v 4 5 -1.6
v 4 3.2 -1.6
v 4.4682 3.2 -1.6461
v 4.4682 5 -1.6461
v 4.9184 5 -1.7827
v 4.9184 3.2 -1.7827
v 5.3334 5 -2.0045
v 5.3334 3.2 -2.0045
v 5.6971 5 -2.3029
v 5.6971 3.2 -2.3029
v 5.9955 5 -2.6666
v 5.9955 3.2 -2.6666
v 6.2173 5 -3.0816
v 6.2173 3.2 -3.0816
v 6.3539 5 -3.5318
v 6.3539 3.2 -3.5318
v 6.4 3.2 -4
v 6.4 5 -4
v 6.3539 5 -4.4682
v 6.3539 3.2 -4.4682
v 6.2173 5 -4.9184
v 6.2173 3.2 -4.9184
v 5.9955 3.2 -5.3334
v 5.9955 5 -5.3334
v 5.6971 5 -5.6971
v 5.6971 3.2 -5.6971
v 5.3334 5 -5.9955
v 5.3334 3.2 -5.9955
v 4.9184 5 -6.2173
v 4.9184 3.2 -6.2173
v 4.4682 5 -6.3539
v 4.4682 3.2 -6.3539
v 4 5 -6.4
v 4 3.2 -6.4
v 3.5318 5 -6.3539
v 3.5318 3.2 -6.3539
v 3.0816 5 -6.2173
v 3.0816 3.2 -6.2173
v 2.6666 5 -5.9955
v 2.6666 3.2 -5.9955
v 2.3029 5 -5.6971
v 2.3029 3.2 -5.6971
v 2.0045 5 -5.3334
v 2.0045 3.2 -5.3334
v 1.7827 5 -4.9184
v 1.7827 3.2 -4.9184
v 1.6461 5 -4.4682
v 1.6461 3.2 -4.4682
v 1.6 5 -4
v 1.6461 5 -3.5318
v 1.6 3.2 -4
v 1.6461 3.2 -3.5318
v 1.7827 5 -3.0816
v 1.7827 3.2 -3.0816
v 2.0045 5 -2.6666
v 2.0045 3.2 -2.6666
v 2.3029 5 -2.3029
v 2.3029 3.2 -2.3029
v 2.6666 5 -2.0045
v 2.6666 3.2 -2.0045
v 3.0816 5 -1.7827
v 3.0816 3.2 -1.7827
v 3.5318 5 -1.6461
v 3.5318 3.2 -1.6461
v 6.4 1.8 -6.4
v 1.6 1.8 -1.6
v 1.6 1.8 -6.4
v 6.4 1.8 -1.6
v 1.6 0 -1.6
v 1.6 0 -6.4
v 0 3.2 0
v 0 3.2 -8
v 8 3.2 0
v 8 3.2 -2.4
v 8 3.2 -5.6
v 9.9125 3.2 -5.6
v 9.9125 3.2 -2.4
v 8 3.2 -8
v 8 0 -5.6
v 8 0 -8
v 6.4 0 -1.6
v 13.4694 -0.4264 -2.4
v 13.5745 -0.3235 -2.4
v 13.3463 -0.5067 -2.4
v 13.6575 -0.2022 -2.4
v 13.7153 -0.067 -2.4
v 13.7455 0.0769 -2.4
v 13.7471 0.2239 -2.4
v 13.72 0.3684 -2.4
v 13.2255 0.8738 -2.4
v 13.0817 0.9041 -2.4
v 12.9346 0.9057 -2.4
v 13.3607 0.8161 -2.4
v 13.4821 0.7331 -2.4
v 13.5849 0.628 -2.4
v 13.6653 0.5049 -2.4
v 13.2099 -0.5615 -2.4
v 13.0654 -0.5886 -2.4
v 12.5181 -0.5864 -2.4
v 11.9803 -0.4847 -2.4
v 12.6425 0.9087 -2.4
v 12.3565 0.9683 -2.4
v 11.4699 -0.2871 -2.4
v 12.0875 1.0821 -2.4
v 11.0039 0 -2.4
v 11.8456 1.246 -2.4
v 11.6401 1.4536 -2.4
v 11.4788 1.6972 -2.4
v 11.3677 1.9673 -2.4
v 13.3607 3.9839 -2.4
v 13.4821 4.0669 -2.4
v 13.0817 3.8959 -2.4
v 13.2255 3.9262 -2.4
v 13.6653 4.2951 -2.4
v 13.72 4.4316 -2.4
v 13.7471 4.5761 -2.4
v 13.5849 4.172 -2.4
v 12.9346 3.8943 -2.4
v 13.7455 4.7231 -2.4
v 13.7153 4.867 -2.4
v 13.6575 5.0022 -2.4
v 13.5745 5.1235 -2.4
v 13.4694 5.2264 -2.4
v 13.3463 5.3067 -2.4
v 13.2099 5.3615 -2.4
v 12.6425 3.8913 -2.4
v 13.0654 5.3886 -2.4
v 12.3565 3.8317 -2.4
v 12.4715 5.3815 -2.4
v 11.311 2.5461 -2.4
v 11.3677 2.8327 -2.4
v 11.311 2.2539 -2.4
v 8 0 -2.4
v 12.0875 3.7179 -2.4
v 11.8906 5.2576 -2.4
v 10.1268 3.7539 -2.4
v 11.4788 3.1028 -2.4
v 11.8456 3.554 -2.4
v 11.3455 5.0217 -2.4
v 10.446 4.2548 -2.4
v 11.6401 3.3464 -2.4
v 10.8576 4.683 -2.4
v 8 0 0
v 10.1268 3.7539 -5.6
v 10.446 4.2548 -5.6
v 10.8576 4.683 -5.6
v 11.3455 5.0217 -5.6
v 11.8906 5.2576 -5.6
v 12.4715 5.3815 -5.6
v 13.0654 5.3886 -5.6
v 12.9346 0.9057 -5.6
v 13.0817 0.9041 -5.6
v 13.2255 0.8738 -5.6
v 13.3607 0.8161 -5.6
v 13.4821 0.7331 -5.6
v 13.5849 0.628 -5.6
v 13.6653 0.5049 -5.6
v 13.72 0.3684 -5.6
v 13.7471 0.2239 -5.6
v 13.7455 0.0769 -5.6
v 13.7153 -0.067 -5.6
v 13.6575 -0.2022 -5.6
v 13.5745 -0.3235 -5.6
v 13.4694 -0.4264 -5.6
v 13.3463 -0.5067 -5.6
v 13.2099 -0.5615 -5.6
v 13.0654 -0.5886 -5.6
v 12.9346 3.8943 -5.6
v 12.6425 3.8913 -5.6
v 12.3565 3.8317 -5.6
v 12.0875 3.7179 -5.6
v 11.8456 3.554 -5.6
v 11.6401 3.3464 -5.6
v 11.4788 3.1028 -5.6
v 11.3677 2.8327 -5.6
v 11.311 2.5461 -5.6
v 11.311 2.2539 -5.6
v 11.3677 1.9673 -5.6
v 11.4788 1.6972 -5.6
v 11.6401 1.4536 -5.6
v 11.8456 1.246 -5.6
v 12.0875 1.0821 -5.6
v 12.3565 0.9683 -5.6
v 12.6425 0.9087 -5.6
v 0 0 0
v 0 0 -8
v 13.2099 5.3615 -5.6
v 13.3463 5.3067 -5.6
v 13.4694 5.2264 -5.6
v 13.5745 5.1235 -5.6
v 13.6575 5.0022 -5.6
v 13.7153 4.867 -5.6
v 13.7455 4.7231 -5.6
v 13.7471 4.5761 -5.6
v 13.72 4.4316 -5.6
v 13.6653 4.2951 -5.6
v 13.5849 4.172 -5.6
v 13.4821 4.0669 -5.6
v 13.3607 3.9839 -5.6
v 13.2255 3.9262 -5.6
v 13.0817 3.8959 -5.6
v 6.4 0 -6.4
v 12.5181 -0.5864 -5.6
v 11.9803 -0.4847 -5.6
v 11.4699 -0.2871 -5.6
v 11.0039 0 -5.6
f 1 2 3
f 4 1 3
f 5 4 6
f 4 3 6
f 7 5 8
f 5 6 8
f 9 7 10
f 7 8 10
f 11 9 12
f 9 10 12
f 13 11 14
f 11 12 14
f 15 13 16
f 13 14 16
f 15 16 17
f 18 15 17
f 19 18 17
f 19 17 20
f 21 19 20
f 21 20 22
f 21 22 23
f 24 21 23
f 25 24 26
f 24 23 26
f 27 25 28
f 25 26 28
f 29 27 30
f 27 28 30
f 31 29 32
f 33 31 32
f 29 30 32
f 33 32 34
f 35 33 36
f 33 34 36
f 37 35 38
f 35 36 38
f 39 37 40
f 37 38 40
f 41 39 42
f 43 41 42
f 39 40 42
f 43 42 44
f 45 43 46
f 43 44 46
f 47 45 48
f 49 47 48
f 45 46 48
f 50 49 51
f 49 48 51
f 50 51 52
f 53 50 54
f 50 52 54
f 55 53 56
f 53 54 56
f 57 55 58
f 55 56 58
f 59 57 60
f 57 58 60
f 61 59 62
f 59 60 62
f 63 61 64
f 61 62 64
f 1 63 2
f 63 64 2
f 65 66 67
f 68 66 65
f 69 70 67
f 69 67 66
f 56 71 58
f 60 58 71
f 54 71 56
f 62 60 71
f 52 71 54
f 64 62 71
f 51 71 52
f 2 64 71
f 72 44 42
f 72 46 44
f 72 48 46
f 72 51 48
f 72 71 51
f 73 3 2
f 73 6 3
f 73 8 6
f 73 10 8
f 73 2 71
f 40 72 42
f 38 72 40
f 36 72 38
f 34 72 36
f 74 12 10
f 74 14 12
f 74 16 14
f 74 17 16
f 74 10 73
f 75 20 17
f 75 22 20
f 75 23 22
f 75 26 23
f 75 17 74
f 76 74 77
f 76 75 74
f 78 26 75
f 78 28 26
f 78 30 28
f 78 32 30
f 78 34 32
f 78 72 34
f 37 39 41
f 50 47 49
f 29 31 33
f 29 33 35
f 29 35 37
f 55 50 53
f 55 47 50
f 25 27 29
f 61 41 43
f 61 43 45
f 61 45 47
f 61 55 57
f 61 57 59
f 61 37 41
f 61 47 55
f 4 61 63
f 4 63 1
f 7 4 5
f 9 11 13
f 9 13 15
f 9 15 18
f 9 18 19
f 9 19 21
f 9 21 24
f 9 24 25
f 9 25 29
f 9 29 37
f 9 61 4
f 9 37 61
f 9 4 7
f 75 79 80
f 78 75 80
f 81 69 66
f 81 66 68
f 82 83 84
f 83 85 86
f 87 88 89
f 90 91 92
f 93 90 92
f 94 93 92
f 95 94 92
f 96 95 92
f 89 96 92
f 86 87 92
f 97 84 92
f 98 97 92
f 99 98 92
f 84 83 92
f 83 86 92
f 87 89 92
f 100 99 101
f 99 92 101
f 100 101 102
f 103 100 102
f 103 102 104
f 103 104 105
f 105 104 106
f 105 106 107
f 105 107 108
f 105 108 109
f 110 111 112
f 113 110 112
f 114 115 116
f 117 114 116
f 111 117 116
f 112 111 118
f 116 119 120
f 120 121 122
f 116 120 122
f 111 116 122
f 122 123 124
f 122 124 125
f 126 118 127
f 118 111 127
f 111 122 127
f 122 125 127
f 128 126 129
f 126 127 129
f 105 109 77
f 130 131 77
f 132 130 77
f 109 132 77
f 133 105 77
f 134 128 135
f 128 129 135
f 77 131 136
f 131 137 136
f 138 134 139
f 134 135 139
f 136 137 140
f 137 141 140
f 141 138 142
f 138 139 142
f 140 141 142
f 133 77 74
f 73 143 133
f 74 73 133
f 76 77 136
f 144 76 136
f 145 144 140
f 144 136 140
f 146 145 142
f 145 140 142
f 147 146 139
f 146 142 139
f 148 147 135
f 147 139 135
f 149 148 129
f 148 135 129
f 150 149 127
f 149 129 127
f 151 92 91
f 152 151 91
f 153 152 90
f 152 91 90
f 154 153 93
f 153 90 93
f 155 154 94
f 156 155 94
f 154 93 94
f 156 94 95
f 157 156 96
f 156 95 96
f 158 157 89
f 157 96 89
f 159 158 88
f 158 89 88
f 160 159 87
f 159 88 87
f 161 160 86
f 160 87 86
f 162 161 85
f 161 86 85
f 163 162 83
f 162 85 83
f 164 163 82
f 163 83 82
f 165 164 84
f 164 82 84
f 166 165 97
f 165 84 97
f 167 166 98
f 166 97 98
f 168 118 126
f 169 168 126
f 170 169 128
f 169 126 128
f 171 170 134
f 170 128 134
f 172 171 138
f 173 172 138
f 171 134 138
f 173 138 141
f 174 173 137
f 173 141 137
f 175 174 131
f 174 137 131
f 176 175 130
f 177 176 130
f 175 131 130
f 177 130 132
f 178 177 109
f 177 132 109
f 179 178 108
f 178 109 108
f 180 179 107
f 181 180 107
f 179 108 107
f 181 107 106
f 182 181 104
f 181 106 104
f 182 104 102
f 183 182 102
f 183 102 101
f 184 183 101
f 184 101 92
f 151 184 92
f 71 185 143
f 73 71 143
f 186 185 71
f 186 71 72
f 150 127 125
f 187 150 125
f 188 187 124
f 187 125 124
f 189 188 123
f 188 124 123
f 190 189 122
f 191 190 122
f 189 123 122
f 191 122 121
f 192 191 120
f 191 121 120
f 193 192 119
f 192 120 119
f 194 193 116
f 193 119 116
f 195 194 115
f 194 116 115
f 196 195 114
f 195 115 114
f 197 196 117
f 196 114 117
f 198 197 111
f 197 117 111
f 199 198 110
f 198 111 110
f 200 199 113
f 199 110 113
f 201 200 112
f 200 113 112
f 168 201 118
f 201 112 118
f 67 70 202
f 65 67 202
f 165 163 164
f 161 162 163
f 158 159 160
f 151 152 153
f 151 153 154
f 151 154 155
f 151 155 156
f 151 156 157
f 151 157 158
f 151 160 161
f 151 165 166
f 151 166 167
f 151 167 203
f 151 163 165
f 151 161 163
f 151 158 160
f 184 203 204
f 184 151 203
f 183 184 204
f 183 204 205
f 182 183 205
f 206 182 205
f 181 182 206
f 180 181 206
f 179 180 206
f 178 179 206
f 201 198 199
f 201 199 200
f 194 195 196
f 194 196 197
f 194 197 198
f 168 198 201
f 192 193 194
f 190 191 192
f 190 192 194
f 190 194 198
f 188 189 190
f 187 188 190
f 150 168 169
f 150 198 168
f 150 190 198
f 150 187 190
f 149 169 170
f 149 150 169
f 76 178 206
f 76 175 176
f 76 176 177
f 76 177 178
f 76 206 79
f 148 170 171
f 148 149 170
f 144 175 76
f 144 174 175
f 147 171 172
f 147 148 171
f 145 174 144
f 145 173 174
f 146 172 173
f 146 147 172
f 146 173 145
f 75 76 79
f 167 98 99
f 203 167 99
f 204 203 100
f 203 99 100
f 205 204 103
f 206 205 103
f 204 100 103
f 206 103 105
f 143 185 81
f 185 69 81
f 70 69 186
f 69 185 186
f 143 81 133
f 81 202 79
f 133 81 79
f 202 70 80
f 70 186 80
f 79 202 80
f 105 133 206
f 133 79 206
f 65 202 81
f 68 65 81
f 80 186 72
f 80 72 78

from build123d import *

# Parameters (mm, degrees)
SKETCH1_W                = 8
SKETCH1_H                = 8
BOSS_EXTRUDE1_DEPTH      = 3.2
SKETCH2_R                = 2.4
BOSS_EXTRUDE2_DEPTH      = 1.8
SKETCH3_W                = 4.8
SKETCH3_H                = 4.8
CUT_EXTRUDE1_DEPTH       = 1.8
BOSS_EXTRUDE3_DEPTH      = 1.6
BOSS_EXTRUDE3_DEPTH_BACK = 1.6


with BuildPart() as part:
    # Sketch1 → Boss-Extrude1 (new body)
    with BuildSketch(Plane(origin=(0, 0, 0), x_dir=(1, 0, 0), z_dir=(0, 1, 0))):
        with Locations((4, 4)):
            Rectangle(SKETCH1_W, SKETCH1_H)
    extrude(amount=BOSS_EXTRUDE1_DEPTH)

    # Sketch2 → Boss-Extrude2 (add)
    with BuildSketch(Plane(origin=(0, 3.2, 0), x_dir=(1, 0, 0), z_dir=(0, 1, 0))):
        with Locations((4, 4)):
            Circle(SKETCH2_R)
    extrude(amount=BOSS_EXTRUDE2_DEPTH)

    # Sketch3 → Cut-Extrude1 (cut)
    with BuildSketch(Plane.XZ):
        with Locations((4, -4)):
            Rectangle(SKETCH3_W, SKETCH3_H)
    extrude(amount=-CUT_EXTRUDE1_DEPTH, mode=Mode.SUBTRACT)

    # Sketch4 → Boss-Extrude3 (add, two sides: drawn at the far end of the back side and taken through both)
    with BuildSketch(Plane(origin=(0, 0, -4), x_dir=(-1, 0, 0), z_dir=(0, 0, -1)).offset(-BOSS_EXTRUDE3_DEPTH_BACK)):
        with BuildLine():
            Line((-8, 3.2), (-9.91253312, 3.2))
            ThreePointArc((-9.91253312, 3.2), (-11.093178218, 4.86443349), (-13.065366807, 5.388584094))
            ThreePointArc((-13.065366807, 5.388584094), (-13.747146024, 4.576071264), (-12.934633193, 3.894292047))
            ThreePointArc((-12.934633193, 3.894292047), (-11.303899579, 2.4), (-12.934633193, 0.905707953))
            ThreePointArc((-12.934633193, 0.905707953), (-13.747146024, 0.223928736), (-13.065366807, -0.588584094))
            ThreePointArc((-13.065366807, -0.588584094), (-11.98026217, -0.48472207), (-11.003899579, 0))
            Line((-11.003899579, 0), (-8, 0))
            Line((-8, 0), (-8, 3.2))
        make_face()
    extrude(amount=BOSS_EXTRUDE3_DEPTH + BOSS_EXTRUDE3_DEPTH_BACK)


solid = part.part
